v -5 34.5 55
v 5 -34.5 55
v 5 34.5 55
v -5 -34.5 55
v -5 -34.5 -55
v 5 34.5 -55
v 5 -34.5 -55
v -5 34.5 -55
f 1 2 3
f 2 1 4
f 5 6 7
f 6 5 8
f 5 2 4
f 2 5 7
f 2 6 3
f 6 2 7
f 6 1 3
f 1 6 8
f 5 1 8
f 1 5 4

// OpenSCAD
/**
 * power-bank-organizer.scad
 * An organizer drawer for my various power banks.
 *
 * @author Nathan Campos <nathan@innoveworkshop.com>
 */

// Ensure a high-quality render.
$fn = $preview ? 36 : 360;

/**
 * Single 18650 cell square tube power bank style.
 *
 * @param height Height of the power bank.
 */
module pb_1c_tube(height = 90) {
	color("orange")
	cube([26, 26, height], center = true);
}

/**
 * Single pouch cell flat case power bank style.
 *
 * @param height Height of the power bank.
 */
module pb_1c_flat(height = 110) {
	color("lightgreen")
	cube([10, 69, height], center = true);
}

/**
 * 3x 18650 cell rounded square tube power bank style.
 *
 * @param height Height of the power bank.
 */
module pb_3c_rdtube(height = 90) {
	width = 61;
	diam = 23;
	spacing = (width / 2) - (diam / 2);

	color("green")
	union() {
		// Middle fill.
		cube([(diam / 4) + (width / 2) + 2, diam, height], center = true);

		// Rounded ends.
		translate([-spacing, 0, 0])
			cylinder(h = height, d = diam, center = true);
		translate([spacing, 0, 0])
			cylinder(h = height, d = diam, center = true);
	}
}

/**
 * Sony CP-V3B power bank.
 *
 * @param height Height of the power bank.
 */
module pb_sony_cpv3b(height = 85) {
	ovalw = 26;
	ovald = 68;
	ovh = 4;

	color("blue")
	translate([ovh, 0, 0])
	linear_extrude(height, center = true)
	difference() {
		// Main oval shape.
		resize([ovalw, ovald])
			circle(d = 20);
		
		// Cutoff part.
		translate([-(ovh + (ovalw / 2)), 0, 0])
		resize([ovalw, ovald])
			square(10, center = true);
	}
}

//pb_1c_tube();
pb_1c_flat();
//pb_3c_rdtube();
//pb_sony_cpv3b();
